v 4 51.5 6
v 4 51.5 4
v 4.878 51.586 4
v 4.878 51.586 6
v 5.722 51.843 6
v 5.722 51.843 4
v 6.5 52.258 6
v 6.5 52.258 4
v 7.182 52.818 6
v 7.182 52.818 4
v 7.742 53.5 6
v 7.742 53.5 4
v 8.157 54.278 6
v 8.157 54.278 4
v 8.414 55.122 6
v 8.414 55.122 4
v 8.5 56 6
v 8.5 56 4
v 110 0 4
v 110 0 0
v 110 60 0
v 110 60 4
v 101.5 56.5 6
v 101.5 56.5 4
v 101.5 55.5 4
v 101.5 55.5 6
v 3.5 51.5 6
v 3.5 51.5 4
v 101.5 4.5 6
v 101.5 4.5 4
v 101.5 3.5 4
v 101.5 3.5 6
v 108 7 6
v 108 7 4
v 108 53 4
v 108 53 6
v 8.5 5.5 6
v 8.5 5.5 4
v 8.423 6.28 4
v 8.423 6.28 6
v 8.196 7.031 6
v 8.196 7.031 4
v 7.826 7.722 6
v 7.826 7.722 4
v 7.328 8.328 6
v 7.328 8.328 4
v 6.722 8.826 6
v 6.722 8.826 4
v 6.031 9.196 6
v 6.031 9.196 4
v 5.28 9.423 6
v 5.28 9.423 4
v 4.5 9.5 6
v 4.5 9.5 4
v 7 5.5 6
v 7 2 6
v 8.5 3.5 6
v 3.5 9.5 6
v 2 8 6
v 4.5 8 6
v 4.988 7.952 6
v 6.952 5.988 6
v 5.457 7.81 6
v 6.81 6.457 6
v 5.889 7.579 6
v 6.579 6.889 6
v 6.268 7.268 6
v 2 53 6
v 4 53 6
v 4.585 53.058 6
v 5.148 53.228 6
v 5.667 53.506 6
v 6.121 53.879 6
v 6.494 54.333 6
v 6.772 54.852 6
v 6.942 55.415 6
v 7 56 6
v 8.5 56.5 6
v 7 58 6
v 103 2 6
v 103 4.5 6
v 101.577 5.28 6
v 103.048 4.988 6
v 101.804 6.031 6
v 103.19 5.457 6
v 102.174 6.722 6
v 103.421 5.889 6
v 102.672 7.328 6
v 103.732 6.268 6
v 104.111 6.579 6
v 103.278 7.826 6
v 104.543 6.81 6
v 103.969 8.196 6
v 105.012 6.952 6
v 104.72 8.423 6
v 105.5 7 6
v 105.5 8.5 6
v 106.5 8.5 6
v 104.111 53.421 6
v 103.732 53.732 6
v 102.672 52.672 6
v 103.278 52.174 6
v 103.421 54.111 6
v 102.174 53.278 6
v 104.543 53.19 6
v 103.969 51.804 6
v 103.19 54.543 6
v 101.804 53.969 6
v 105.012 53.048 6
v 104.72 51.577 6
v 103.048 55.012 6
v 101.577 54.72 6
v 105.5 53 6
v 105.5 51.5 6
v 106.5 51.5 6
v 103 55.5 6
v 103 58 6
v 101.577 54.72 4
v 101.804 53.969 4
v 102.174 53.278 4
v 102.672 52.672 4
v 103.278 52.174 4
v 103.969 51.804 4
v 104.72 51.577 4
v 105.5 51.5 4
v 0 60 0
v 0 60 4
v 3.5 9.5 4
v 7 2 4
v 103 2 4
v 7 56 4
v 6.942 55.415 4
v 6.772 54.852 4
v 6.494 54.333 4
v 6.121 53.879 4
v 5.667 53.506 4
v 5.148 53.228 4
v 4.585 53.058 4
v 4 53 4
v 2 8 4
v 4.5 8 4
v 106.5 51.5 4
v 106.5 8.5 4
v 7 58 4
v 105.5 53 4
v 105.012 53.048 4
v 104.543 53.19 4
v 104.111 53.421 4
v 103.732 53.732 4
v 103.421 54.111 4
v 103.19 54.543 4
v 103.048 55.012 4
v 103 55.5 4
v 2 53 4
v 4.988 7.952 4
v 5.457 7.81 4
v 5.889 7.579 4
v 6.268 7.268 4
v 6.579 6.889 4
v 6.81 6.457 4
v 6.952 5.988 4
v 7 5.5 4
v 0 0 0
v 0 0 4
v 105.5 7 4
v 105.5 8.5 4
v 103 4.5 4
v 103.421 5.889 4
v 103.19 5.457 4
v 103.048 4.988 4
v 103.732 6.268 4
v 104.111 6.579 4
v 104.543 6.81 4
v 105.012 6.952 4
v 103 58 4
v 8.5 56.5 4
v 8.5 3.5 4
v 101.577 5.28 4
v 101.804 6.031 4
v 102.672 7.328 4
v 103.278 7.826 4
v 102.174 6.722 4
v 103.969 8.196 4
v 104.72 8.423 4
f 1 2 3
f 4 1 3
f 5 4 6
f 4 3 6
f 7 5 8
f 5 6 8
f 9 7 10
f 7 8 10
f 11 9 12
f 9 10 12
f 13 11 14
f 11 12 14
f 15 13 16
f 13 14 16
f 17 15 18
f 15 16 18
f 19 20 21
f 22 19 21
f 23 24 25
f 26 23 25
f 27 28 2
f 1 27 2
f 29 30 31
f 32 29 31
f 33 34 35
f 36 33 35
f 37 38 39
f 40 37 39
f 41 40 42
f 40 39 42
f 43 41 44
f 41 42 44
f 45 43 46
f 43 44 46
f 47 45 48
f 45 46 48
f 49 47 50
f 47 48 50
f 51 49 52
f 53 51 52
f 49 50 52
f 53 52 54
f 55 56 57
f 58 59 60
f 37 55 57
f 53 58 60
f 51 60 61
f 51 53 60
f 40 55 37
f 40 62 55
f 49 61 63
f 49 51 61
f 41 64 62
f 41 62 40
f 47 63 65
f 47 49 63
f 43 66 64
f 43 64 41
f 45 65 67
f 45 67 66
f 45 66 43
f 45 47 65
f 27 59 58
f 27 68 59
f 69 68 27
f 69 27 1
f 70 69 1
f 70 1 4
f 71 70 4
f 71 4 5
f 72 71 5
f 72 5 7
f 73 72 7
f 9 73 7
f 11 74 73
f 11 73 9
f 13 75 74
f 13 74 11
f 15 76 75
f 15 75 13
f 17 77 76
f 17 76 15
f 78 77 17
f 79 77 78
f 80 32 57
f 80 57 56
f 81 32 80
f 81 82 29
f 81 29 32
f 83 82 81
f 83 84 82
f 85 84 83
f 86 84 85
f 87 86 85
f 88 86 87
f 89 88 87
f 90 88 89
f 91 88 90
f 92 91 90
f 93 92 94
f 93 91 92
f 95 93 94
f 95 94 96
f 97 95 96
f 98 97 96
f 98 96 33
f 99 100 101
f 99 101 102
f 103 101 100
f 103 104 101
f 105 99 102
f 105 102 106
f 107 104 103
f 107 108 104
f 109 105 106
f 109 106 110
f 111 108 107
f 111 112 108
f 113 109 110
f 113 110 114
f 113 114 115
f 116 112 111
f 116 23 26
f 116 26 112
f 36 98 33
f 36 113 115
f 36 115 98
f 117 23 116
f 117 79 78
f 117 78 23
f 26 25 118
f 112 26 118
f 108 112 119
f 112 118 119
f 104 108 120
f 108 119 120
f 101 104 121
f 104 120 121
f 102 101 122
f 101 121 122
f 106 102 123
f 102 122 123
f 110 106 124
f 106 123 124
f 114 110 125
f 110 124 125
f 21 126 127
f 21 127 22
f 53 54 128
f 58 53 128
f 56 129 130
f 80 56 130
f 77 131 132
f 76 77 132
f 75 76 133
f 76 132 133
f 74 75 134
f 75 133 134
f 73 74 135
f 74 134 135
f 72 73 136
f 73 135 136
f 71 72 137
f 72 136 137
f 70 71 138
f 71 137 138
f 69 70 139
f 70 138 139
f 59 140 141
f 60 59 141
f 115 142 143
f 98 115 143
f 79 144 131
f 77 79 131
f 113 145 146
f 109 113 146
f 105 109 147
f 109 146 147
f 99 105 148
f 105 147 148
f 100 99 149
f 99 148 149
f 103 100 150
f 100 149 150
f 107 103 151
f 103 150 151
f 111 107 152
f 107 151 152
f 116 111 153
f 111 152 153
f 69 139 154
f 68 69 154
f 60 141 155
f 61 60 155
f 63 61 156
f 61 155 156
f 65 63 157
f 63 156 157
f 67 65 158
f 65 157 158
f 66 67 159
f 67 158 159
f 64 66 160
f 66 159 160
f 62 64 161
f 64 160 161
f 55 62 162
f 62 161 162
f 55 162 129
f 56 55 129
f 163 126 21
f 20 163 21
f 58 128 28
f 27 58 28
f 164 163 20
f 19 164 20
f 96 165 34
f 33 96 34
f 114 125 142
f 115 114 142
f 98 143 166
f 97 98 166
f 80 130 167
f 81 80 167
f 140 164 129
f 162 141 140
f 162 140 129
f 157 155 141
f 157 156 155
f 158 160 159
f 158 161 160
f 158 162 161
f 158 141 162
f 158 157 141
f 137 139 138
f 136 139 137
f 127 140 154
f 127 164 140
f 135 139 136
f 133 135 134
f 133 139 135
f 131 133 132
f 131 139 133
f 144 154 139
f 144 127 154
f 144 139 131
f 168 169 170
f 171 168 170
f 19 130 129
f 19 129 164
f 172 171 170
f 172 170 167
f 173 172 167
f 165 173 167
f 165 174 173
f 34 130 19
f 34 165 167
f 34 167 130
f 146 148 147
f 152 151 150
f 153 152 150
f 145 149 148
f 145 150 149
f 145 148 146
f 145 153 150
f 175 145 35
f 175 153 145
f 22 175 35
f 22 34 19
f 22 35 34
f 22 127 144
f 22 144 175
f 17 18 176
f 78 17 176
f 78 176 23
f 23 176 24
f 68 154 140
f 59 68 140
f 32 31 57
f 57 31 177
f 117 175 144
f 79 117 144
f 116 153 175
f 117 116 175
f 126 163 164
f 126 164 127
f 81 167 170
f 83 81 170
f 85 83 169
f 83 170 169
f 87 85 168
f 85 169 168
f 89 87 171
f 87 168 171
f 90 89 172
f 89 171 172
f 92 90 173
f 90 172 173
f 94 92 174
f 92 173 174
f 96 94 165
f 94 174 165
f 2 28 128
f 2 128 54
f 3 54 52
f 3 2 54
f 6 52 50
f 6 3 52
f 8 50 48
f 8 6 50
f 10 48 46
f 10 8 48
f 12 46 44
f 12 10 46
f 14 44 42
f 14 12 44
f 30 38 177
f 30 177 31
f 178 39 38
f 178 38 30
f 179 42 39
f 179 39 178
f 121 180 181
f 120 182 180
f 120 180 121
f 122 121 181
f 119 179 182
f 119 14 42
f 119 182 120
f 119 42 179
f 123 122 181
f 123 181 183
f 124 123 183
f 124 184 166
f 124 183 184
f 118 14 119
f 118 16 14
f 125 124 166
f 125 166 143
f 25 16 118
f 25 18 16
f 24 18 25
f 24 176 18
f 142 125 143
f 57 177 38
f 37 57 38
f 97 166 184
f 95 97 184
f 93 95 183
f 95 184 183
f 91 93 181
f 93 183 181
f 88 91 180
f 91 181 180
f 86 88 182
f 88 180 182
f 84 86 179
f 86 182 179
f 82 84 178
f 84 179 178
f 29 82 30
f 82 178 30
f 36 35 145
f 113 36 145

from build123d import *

# Parameters (mm, degrees)
F0_W     = 110
F0_H     = 60
F1_DEPTH = 4
F3_DEPTH = 2


with BuildPart() as f1:
    # F0 (on Top) → F1 (new body)
    with BuildSketch(Plane.XY):
        with Locations((55, 30)):
            Rectangle(F0_W, F0_H)
    extrude(amount=F1_DEPTH)

    # F2 (on face) → F3 (join)
    with BuildSketch(Plane.XY.offset(4)):
        with BuildLine():
            ThreePointArc((7, 56), (6.12132, 53.87868), (4, 53))
            Line((4, 53), (2, 53))
            Line((2, 53), (2, 8))
            Line((2, 8), (4.5, 8))
            ThreePointArc((4.5, 8), (6.267767, 7.267767), (7, 5.5))
            Line((7, 5.5), (7, 2))
            Line((7, 2), (103, 2))
            Line((103, 2), (103, 4.5))
            ThreePointArc((103, 4.5), (103.732233, 6.267767), (105.5, 7))
            Line((105.5, 7), (108, 7))
            Line((108, 7), (108, 53))
            Line((108, 53), (105.5, 53))
            ThreePointArc((105.5, 53), (103.732233, 53.732233), (103, 55.5))
            Line((103, 55.5), (103, 58))
            Line((103, 58), (7, 58))
            Line((7, 58), (7, 56))
        make_face()
        with BuildLine():
            Line((4.5, 9.5), (3.5, 9.5))
            Line((3.5, 9.5), (3.5, 51.5))
            Line((3.5, 51.5), (4, 51.5))
            ThreePointArc((4, 51.5), (7.181981, 52.818019), (8.5, 56))
            Line((8.5, 56), (8.5, 56.5))
            Line((8.5, 56.5), (101.5, 56.5))
            Line((101.5, 56.5), (101.5, 55.5))
            ThreePointArc((101.5, 55.5), (102.671573, 52.671573), (105.5, 51.5))
            Line((105.5, 51.5), (106.5, 51.5))
            Line((106.5, 51.5), (106.5, 8.5))
            Line((106.5, 8.5), (105.5, 8.5))
            ThreePointArc((105.5, 8.5), (102.671573, 7.328427), (101.5, 4.5))
            Line((101.5, 4.5), (101.5, 3.5))
            Line((101.5, 3.5), (8.5, 3.5))
            Line((8.5, 3.5), (8.5, 5.5))
            ThreePointArc((8.5, 5.5), (7.328427, 8.328427), (4.5, 9.5))
        make_face(mode=Mode.SUBTRACT)
    extrude(amount=F3_DEPTH)


solid = f1.part
